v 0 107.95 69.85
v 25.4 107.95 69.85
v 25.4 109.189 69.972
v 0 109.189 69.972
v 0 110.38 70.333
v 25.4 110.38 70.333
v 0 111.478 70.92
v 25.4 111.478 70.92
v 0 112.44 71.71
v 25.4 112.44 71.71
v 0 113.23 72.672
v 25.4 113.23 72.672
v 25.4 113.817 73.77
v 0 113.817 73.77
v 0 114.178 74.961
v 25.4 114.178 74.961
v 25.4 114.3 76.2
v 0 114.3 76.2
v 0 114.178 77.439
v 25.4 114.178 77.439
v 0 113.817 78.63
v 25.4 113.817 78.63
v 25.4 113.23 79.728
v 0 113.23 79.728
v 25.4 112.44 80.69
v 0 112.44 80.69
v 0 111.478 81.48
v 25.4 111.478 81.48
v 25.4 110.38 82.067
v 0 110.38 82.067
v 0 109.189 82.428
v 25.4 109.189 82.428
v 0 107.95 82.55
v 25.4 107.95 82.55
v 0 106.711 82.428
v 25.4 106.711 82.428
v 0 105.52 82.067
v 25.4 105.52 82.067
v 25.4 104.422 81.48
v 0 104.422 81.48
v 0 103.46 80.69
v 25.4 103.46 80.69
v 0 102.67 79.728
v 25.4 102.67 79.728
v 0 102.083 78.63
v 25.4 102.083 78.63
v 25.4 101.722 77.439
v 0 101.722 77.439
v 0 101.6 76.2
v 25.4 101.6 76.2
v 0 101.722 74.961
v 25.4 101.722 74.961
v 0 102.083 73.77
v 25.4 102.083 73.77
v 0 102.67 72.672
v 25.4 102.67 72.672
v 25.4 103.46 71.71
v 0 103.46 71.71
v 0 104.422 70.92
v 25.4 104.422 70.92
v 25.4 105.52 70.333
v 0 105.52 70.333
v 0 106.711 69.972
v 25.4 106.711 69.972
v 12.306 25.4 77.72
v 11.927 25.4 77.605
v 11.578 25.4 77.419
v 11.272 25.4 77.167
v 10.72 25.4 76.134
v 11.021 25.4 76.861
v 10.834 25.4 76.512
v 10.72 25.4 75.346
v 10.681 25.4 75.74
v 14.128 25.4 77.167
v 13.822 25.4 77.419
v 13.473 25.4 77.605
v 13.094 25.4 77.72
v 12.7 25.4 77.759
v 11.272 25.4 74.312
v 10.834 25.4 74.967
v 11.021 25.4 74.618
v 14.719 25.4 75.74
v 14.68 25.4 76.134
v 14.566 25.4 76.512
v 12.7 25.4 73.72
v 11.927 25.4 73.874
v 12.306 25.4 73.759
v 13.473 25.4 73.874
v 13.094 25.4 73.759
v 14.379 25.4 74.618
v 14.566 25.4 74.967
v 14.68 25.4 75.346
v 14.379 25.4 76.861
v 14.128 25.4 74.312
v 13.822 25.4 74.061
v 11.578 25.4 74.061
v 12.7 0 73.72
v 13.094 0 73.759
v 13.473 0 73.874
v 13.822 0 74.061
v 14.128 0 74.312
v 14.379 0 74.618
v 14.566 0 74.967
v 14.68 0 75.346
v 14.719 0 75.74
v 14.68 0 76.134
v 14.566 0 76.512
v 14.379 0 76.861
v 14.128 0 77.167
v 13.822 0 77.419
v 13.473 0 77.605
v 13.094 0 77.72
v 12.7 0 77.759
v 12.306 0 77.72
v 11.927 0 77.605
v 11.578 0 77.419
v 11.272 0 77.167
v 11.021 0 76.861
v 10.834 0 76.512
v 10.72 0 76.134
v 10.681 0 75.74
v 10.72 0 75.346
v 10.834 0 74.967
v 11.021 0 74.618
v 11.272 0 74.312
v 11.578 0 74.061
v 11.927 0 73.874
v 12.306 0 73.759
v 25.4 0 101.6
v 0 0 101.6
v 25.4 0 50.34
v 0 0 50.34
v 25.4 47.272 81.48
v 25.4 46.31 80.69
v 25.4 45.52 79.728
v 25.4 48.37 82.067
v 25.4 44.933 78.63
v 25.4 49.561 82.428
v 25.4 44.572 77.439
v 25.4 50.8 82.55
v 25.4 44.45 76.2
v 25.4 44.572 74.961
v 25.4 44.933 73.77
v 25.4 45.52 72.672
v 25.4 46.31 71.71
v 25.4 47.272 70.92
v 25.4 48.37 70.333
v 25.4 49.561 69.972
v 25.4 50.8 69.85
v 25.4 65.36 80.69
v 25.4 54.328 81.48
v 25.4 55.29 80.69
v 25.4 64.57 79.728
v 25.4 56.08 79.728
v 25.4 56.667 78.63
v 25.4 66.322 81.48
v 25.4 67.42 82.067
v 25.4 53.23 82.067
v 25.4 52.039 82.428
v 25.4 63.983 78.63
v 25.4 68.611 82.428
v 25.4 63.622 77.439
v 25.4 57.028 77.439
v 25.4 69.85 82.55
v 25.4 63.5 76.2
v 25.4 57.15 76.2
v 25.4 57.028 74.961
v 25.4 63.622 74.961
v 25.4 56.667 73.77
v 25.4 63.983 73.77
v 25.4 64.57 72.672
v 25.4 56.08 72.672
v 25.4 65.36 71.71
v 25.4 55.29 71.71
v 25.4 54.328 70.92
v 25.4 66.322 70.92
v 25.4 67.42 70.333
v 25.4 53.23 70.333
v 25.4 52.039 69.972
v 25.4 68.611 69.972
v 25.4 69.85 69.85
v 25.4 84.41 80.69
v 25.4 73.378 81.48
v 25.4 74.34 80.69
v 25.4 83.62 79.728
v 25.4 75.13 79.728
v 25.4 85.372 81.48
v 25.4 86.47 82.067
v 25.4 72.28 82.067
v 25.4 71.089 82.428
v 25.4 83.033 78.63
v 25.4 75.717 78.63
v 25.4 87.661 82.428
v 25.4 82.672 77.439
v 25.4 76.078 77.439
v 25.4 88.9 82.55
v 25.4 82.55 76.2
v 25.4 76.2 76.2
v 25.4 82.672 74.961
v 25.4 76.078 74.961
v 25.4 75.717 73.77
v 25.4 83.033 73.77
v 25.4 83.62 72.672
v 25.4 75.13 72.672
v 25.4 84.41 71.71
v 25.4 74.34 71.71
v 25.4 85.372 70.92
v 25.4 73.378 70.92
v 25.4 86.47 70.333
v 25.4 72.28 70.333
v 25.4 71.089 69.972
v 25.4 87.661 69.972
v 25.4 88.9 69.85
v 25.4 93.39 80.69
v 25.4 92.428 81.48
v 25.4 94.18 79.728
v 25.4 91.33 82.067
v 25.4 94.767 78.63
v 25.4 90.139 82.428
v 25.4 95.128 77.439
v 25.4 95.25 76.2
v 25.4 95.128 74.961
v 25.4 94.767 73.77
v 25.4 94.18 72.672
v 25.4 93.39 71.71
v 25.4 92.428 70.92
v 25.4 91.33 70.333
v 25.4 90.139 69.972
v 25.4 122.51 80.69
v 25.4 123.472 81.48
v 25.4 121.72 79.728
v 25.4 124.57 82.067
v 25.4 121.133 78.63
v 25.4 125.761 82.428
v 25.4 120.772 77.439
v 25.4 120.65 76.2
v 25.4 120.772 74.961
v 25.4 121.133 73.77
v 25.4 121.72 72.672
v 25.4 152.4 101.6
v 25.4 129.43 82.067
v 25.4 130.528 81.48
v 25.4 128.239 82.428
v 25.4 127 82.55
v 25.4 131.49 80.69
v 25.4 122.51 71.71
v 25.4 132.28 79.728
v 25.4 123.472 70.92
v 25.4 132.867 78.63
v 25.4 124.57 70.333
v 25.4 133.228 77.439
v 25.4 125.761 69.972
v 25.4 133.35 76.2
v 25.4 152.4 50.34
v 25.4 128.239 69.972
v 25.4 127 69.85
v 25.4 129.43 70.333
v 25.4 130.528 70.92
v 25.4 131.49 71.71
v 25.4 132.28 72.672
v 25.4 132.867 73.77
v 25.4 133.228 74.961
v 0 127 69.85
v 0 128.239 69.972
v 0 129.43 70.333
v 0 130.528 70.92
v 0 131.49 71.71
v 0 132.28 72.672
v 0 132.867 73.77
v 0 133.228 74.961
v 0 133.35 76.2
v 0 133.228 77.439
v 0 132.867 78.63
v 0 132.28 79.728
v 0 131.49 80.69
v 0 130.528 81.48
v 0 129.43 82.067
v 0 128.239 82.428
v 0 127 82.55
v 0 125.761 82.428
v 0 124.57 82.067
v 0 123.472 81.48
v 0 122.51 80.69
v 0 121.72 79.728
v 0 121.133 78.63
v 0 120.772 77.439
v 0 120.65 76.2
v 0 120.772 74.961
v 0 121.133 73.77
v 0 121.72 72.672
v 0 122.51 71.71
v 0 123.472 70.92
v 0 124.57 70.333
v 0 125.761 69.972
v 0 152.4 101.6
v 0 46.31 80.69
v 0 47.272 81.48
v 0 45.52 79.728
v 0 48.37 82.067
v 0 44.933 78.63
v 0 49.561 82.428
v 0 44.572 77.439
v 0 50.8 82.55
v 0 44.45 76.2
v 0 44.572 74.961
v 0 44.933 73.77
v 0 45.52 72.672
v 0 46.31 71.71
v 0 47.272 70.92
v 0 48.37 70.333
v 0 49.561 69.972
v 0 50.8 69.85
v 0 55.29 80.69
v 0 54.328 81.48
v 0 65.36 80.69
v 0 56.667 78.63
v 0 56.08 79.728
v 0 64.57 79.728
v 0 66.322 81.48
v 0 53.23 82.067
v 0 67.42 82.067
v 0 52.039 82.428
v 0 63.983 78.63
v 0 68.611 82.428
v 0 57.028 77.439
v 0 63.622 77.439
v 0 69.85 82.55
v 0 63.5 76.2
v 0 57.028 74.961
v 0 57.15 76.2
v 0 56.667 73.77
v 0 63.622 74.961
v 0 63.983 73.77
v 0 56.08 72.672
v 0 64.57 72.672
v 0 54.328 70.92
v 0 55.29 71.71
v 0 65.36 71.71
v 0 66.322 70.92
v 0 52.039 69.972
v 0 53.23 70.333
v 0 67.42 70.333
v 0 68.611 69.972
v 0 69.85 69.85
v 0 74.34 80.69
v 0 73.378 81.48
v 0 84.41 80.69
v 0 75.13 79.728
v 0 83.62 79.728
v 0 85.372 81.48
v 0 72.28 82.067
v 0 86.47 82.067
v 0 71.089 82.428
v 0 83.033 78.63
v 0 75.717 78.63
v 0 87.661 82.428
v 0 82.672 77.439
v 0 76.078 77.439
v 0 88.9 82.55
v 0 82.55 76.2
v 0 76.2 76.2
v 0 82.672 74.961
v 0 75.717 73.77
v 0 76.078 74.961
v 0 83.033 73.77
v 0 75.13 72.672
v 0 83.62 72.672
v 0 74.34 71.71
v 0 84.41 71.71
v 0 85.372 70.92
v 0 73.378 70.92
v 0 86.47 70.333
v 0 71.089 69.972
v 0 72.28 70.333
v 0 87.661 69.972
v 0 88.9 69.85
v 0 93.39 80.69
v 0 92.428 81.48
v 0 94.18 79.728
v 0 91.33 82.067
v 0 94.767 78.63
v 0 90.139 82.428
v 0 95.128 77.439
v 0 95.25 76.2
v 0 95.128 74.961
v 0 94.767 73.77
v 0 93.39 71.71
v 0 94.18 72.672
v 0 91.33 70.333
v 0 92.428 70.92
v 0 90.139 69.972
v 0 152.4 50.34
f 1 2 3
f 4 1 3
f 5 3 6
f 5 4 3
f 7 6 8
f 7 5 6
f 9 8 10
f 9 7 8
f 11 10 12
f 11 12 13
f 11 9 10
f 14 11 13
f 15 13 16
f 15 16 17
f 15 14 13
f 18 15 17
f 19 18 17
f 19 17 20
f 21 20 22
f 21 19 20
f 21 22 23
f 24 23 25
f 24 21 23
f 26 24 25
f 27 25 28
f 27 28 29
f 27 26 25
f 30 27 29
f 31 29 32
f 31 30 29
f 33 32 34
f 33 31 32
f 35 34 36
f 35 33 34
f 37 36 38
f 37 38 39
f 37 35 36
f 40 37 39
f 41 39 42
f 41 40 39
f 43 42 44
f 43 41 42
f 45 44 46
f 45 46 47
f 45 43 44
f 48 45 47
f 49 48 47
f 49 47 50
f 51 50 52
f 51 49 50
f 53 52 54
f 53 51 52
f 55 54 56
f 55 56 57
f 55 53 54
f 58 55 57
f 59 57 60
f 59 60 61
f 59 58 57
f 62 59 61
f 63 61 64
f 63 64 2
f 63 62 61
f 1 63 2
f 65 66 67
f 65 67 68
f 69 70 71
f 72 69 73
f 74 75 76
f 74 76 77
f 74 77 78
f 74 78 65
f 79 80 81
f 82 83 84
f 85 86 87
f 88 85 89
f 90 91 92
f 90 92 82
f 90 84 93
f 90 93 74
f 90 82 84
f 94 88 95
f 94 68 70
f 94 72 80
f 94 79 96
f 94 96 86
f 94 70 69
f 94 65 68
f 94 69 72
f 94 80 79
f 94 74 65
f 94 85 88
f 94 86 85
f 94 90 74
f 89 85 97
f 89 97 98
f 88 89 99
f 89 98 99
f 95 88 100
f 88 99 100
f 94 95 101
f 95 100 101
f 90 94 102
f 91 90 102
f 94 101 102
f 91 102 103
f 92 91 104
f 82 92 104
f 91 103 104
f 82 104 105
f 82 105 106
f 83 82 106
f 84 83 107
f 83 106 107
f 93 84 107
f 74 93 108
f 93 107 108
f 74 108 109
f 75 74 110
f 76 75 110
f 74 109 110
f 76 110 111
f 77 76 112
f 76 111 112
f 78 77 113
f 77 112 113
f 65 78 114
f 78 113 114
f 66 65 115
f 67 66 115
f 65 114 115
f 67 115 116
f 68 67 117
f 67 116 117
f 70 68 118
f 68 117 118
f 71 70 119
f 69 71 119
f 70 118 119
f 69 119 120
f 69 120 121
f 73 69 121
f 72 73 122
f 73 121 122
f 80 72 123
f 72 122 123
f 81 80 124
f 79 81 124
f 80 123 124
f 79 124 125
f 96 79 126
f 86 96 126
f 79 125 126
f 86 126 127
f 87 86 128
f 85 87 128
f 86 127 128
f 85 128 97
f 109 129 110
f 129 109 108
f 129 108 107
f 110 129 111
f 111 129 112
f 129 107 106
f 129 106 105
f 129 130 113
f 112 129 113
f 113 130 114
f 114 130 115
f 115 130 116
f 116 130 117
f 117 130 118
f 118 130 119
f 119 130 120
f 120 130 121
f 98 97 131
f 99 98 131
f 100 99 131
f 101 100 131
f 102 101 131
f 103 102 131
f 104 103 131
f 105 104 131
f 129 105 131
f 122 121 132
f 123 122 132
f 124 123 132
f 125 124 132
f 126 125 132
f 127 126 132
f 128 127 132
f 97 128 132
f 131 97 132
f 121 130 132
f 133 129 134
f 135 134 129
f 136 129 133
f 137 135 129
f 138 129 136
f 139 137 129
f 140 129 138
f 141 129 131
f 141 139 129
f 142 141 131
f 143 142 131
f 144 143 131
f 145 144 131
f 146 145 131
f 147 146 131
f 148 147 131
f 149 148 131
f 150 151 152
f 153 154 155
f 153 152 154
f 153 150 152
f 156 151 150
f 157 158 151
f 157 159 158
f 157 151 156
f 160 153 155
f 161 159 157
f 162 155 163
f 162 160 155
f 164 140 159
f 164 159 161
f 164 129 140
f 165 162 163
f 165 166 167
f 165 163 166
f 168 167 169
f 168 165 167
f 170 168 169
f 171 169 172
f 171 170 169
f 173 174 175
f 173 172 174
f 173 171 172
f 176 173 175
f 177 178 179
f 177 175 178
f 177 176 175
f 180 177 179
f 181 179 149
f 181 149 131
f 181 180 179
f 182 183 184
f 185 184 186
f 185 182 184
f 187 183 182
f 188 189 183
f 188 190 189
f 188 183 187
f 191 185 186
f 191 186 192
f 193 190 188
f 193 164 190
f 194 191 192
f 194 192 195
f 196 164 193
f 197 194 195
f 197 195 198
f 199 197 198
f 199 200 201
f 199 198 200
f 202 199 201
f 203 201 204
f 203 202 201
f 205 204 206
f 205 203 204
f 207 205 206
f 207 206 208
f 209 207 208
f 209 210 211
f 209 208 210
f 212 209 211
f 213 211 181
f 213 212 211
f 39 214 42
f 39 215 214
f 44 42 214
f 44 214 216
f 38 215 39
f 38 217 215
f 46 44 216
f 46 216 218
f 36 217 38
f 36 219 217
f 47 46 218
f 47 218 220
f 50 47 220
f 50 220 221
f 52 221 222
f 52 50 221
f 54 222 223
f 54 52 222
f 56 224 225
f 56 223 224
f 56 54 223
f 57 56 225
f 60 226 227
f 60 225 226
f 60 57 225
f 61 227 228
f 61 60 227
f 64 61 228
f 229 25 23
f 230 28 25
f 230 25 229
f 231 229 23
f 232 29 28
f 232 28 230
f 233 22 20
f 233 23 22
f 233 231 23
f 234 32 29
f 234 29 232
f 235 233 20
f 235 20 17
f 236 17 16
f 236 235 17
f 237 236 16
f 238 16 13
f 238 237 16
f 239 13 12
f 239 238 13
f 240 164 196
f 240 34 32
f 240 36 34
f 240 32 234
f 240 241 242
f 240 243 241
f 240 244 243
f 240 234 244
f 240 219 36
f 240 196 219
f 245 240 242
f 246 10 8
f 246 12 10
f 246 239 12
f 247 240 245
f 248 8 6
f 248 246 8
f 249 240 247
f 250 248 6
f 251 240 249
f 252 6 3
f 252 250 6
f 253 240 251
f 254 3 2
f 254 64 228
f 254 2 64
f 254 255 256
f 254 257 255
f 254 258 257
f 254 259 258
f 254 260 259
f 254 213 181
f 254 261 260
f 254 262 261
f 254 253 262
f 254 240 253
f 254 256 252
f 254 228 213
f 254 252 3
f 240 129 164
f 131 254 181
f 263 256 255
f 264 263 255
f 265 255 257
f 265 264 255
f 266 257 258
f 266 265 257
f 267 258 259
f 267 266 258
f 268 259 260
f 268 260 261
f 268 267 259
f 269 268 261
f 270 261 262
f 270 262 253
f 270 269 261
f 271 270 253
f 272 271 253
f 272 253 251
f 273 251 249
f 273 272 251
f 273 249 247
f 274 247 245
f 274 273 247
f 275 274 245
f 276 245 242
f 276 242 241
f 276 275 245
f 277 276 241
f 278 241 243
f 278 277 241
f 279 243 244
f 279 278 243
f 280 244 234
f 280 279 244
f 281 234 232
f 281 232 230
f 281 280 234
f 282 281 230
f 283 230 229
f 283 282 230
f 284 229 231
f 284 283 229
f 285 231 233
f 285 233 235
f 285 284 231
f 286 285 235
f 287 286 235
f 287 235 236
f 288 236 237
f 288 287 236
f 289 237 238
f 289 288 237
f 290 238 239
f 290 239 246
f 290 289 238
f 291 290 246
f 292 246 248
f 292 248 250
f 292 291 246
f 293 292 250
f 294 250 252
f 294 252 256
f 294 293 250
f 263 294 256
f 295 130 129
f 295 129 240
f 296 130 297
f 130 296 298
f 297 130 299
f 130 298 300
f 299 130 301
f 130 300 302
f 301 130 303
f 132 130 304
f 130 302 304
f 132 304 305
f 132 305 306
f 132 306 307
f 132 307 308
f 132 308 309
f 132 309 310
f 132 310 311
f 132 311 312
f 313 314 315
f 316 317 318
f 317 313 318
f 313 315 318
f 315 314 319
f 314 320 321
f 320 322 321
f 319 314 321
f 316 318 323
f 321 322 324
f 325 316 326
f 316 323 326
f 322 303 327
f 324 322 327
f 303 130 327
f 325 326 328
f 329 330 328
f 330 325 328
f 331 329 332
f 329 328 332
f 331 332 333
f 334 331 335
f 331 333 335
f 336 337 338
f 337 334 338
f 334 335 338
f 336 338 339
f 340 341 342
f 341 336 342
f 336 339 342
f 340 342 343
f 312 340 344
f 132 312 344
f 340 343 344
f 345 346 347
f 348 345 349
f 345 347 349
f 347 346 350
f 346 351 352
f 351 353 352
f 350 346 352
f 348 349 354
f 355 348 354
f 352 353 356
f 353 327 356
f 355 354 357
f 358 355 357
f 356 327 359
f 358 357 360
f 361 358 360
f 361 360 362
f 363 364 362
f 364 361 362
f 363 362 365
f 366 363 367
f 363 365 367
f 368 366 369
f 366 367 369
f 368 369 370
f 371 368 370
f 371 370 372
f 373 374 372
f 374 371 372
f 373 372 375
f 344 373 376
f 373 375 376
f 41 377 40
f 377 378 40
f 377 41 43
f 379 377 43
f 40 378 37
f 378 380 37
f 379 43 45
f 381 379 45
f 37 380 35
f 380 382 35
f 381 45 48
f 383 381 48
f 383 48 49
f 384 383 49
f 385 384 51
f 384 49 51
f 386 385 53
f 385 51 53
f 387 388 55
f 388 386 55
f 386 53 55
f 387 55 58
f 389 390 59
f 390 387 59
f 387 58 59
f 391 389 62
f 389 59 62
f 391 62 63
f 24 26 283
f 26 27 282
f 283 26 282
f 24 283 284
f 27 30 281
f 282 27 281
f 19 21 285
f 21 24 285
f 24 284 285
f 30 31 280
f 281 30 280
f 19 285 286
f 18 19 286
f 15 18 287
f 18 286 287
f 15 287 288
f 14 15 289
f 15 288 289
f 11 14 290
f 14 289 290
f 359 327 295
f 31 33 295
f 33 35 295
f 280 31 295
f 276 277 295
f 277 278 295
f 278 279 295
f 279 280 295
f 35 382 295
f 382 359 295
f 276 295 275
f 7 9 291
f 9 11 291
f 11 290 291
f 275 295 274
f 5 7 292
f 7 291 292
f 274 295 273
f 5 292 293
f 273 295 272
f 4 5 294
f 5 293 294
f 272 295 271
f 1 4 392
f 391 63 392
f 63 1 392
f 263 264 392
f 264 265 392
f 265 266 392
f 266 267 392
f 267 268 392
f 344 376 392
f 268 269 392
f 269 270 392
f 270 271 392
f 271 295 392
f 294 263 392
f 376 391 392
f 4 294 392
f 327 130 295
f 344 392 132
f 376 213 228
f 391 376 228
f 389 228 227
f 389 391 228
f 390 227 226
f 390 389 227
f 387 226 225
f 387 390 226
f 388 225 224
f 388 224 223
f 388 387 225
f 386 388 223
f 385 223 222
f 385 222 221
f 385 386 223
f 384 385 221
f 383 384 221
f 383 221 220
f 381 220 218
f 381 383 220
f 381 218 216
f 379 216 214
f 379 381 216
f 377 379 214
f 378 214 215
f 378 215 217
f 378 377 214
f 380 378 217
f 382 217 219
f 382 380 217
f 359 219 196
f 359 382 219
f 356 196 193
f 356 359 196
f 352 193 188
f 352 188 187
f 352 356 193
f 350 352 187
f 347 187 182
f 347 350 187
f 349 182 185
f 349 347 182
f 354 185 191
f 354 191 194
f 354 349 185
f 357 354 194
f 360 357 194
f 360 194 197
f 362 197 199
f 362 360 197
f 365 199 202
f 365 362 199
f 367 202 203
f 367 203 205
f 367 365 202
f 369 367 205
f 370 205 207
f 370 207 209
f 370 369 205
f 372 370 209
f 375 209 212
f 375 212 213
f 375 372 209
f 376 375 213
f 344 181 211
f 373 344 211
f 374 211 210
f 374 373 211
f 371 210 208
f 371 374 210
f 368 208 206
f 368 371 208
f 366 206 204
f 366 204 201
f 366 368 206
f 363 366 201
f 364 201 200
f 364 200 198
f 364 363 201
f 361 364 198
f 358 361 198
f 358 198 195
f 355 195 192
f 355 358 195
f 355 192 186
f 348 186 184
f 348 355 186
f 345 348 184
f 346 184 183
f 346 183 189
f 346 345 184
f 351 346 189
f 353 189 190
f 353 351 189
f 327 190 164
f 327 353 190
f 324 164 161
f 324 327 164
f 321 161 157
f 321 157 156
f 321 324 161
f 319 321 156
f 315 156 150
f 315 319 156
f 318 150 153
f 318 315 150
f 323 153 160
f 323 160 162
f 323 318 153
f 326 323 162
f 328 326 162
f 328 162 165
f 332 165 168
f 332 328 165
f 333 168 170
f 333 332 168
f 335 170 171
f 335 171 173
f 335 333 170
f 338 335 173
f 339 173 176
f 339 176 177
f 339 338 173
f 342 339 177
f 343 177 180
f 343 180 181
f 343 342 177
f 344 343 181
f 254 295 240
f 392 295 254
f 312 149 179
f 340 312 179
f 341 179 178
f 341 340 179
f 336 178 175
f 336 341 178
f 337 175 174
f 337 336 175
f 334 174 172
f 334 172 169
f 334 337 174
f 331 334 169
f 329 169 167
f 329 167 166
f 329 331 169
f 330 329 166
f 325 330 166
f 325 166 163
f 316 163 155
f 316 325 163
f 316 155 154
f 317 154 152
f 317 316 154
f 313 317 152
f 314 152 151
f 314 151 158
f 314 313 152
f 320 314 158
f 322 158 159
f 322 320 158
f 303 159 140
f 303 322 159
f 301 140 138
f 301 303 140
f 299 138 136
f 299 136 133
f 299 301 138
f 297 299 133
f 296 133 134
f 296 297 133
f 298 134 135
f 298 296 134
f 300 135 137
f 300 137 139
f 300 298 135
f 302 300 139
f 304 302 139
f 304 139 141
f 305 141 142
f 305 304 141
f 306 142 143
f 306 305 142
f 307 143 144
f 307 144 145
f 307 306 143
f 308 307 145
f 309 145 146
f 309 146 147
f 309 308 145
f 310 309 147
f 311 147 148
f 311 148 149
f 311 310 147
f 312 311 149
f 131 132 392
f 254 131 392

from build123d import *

# Parameters (mm, degrees)
SKETCH1_W           = 51.260430681
SKETCH1_H           = 152.4
SKETCH1_R           = 6.35
BOSS_EXTRUDE1_DEPTH = 25.4
SKETCH6_R           = 2.0193
CUT_EXTRUDE4_DEPTH  = 25.4


with BuildPart() as part:
    # Sketch1 → Boss-Extrude1 (new body)
    with BuildSketch(Plane(origin=(0, 0, 0), x_dir=(0, 0, -1), z_dir=(1, 0, 0))):
        with Locations((-75.96978466, 76.2)):
            Rectangle(SKETCH1_W, SKETCH1_H)
        with Locations((-76.2, 50.8)):
            Circle(SKETCH1_R, mode=Mode.SUBTRACT)
        with Locations((-76.2, 69.85)):
            Circle(SKETCH1_R, mode=Mode.SUBTRACT)
        with Locations((-76.2, 88.9)):
            Circle(SKETCH1_R, mode=Mode.SUBTRACT)
        with Locations((-76.2, 107.95)):
            Circle(SKETCH1_R, mode=Mode.SUBTRACT)
        with Locations((-76.2, 127)):
            Circle(SKETCH1_R, mode=Mode.SUBTRACT)
    extrude(amount=BOSS_EXTRUDE1_DEPTH)

    # Sketch6 → Cut-Extrude4 (cut)
    with BuildSketch(Plane.XZ):
        with Locations(Location((12.7, 75.739569319, 0), (0, 0, 270))):
            Circle(SKETCH6_R)
    extrude(amount=-CUT_EXTRUDE4_DEPTH, mode=Mode.SUBTRACT)


solid = part.part
